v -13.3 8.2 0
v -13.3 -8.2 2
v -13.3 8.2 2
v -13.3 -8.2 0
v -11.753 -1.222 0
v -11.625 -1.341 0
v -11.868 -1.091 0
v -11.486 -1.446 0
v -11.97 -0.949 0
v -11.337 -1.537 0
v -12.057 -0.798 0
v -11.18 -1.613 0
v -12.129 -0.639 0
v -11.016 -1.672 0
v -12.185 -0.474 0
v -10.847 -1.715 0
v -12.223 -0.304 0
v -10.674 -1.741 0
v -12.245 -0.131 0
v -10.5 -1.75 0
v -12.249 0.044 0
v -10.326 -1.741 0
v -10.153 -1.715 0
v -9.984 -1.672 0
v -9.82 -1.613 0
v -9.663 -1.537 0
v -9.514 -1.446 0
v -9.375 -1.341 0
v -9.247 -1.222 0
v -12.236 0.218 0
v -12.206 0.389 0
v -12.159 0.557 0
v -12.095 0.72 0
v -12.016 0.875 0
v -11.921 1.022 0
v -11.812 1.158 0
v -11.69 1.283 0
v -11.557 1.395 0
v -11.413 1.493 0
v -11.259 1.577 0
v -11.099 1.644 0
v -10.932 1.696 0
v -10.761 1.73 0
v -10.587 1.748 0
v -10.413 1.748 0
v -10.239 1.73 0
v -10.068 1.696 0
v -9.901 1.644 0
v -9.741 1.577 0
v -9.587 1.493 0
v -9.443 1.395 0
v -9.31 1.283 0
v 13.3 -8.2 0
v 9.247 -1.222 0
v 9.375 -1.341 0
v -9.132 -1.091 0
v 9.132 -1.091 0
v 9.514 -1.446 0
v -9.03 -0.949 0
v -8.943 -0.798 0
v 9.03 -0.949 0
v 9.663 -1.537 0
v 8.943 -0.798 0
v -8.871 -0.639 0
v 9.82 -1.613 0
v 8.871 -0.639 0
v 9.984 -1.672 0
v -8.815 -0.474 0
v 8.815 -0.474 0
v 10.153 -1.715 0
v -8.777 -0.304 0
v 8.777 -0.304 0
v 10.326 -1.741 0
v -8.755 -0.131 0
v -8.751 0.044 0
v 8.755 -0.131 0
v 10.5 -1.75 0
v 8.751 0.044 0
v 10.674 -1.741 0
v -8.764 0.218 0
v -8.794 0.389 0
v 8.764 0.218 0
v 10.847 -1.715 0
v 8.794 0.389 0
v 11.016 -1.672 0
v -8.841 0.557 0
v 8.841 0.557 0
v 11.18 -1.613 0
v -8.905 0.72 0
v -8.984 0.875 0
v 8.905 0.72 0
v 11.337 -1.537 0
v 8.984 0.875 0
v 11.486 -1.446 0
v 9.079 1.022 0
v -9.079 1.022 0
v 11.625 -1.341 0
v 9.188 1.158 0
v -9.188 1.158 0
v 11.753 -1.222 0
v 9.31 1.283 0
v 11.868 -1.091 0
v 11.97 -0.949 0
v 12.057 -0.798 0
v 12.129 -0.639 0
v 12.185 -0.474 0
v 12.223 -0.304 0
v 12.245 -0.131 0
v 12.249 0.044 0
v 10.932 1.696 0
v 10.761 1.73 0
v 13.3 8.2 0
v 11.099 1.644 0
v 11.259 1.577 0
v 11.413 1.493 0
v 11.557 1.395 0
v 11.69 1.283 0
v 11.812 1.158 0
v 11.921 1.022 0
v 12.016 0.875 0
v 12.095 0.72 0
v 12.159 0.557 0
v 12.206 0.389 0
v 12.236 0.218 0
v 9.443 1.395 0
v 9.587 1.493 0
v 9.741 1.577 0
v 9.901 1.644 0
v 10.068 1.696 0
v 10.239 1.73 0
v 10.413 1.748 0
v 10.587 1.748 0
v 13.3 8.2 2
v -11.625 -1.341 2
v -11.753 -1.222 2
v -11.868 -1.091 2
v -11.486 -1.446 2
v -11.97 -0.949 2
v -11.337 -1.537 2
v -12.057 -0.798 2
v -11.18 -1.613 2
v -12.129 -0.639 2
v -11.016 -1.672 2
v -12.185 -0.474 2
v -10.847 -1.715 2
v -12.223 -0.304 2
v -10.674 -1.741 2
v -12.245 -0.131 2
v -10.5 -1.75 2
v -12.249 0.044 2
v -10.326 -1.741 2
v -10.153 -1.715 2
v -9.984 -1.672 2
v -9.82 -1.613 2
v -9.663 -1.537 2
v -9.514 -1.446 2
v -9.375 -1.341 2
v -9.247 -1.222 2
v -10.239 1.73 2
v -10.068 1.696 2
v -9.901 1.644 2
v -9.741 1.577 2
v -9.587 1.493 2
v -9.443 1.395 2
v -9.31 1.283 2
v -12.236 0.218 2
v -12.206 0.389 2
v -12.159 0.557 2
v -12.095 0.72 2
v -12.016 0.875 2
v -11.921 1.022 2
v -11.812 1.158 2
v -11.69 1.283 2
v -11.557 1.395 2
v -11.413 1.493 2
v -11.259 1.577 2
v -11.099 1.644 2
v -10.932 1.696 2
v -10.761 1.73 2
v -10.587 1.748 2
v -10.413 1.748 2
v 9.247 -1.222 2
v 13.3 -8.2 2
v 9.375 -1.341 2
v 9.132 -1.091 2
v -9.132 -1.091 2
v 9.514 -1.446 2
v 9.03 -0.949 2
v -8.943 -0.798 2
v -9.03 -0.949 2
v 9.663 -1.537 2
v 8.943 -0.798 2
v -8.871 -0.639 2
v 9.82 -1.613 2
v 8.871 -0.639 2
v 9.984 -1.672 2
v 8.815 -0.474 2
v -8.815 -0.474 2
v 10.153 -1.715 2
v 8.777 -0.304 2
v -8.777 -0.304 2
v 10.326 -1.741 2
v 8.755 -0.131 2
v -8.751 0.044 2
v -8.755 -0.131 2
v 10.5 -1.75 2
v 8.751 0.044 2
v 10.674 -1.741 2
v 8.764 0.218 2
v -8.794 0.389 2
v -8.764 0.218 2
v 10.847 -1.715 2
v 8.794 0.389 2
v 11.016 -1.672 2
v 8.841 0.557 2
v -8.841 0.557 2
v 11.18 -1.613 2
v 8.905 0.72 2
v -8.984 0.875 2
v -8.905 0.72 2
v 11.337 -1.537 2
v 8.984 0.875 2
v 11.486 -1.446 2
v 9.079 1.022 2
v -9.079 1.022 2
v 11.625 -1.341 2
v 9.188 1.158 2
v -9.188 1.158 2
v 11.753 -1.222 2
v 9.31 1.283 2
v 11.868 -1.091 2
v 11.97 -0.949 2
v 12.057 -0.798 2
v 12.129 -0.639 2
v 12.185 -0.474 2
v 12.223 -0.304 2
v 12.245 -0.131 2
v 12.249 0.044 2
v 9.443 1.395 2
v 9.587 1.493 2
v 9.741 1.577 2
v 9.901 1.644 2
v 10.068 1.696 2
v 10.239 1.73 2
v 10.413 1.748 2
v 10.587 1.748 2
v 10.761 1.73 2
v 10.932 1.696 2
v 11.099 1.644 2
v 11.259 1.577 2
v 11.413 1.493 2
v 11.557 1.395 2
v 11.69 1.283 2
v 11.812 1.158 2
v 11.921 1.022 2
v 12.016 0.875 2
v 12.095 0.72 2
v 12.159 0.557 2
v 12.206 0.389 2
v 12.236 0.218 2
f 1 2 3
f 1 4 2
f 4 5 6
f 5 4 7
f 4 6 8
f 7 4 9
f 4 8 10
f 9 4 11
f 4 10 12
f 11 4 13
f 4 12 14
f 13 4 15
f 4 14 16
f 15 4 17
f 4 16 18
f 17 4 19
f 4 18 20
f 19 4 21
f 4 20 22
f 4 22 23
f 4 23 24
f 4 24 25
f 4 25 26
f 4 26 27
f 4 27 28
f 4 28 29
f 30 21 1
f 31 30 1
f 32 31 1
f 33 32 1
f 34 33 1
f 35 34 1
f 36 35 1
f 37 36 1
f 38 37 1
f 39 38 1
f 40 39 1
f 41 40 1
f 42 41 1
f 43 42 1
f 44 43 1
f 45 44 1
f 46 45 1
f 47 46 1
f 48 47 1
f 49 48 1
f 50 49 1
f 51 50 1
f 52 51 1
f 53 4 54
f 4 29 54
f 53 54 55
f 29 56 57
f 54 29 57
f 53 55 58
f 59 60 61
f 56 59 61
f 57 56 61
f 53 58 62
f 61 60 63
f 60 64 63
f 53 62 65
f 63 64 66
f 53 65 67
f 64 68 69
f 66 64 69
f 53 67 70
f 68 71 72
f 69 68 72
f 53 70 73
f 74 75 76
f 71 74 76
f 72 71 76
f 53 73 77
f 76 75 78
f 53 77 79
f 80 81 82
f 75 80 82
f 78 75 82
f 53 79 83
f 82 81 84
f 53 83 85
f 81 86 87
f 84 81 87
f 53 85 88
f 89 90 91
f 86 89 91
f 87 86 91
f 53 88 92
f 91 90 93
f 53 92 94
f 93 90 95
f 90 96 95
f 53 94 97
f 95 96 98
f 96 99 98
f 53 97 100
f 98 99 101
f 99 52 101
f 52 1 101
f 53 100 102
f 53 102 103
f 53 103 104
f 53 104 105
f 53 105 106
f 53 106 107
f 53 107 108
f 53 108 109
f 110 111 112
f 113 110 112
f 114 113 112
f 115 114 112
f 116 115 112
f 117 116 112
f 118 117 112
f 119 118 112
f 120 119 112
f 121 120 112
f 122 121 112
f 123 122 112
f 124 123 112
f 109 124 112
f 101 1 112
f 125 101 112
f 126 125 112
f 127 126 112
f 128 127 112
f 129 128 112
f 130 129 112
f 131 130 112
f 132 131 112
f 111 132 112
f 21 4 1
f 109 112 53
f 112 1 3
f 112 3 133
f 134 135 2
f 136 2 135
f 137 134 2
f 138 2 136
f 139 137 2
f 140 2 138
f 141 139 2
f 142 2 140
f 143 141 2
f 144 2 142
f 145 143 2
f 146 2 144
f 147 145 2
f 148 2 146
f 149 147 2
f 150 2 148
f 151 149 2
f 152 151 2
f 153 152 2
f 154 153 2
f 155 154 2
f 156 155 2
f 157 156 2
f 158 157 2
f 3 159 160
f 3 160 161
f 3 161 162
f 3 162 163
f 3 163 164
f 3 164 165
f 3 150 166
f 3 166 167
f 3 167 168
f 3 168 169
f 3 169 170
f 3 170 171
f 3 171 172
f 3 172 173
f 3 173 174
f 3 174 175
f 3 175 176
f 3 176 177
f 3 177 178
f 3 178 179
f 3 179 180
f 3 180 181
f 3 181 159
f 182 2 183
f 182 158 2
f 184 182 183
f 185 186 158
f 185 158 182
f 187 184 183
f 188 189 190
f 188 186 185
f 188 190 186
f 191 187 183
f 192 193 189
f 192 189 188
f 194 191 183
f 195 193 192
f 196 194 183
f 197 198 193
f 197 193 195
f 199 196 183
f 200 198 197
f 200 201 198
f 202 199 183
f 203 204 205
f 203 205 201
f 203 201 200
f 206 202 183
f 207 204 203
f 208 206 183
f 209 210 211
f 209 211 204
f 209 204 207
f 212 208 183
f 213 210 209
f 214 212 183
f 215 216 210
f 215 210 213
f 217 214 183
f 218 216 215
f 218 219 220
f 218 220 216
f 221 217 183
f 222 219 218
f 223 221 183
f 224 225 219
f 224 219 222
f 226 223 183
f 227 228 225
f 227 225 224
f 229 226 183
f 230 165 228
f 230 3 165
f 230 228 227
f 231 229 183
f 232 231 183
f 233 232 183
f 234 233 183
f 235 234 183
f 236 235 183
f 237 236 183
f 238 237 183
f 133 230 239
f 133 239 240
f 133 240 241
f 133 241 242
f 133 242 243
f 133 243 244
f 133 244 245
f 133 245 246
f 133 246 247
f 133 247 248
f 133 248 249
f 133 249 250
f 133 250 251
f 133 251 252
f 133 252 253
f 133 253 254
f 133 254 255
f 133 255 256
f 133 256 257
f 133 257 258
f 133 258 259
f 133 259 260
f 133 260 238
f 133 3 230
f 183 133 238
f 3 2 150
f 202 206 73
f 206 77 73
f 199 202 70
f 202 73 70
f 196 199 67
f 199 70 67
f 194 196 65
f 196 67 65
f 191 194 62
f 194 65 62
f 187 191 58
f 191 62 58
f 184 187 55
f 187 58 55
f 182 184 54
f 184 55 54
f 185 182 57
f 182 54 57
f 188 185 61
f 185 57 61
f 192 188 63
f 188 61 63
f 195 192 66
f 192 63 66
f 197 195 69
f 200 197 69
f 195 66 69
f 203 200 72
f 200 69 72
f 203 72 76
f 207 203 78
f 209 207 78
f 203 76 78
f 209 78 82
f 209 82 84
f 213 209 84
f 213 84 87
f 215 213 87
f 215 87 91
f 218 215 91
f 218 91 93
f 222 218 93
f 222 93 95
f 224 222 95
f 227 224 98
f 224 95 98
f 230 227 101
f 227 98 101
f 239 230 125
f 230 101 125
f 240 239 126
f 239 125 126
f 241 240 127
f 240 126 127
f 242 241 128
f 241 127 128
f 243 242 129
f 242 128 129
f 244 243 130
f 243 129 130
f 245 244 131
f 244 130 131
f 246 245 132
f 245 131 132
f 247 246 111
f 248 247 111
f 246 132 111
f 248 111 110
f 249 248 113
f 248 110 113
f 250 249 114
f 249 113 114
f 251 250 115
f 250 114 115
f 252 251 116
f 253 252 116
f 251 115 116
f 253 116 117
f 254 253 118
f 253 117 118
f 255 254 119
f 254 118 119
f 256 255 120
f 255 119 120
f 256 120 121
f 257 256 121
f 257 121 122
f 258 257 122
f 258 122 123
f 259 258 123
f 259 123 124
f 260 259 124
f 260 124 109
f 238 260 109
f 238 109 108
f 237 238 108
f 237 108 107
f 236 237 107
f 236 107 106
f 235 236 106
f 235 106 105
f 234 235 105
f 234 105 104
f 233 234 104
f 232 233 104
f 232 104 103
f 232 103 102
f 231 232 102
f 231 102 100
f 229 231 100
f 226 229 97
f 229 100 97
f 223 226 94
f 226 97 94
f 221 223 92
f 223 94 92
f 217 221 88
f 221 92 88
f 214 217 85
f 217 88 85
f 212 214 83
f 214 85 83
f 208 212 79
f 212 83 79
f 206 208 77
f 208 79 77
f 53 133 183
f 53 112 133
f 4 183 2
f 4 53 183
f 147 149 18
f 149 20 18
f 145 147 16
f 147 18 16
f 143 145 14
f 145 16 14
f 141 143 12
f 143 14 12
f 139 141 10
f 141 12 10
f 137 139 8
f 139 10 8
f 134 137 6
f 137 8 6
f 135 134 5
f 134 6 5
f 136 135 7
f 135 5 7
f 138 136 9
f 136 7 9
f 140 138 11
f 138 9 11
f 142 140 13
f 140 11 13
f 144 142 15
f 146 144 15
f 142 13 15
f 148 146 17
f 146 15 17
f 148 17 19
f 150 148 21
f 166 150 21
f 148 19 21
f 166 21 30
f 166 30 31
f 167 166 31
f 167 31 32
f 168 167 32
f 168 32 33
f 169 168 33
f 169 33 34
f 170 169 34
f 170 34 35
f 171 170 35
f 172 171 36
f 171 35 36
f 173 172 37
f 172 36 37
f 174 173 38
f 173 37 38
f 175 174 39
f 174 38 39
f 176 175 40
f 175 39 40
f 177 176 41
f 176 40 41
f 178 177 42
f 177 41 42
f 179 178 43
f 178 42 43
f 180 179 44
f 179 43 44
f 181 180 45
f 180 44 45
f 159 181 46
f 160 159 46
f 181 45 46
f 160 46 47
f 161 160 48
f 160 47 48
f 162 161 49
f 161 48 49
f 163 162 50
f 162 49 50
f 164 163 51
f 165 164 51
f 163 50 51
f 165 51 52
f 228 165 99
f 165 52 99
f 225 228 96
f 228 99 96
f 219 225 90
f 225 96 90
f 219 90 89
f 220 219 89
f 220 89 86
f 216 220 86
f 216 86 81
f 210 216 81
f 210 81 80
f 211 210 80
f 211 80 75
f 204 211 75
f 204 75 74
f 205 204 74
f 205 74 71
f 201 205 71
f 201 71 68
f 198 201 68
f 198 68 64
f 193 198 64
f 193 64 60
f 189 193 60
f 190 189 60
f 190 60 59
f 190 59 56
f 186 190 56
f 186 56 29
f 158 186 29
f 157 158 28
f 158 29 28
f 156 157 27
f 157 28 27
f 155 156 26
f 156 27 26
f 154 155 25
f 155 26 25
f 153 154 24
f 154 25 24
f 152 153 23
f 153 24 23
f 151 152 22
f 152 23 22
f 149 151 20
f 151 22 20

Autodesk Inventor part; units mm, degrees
ref_plane "YZ Plane" through (0, 0, 0) normal (1, 0, 0) x (0, 1, 0)
ref_plane "XZ Plane" through (0, 0, 0) normal (0, 1, 0) x (-1, 0, 0)
ref_plane "XY Plane" through (0, 0, 0) normal (0, 0, 1) x (1, 0, 0)
sketch "Sketch1" plane through (0, 0, 0) normal (0, 0, 1) x (1, 0, 0)
  line L0 (-13.3, 8.2) -> (13.3, 8.2)
  line L1 (13.3, 8.2) -> (13.3, -8.2)
  line L2 (13.3, -8.2) -> (-13.3, -8.2)
  line L3 (-13.3, -8.2) -> (-13.3, 8.2)
  point P0 (0, 0)
  point P1 (-13.3, 0)
  point P2 (0, 8.2)
  dimension "d0" = 26.6
  dimension "d1" = 16.4
extrude "Extrusion1" add sketch "Sketch1" along normal blind 2
sketch "Sketch2" plane through (0, 0, 2) normal (0, 0, 1) x (1, 0, 0)
  circle A0 centre (-10.5, 0) radius 1.5
  circle A1 centre (10.5, 0) radius 1.5
  point P0 (0, 0)
  dimension "d4" = 3
  dimension "d5" = 21
  dimension "d6" = 10.5
hole "Hole1" at (10.5, 0, 2) direction (0, 0, -1) diameter 3.5 end through all
pattern_linear "Rectangular Pattern1" count 2 spacing 21 along (-1, 0, 0) of "Hole1"
equation "\"d6\" = 0.5 * d5"
equation "\"d16\" = d5"
properties part number "LogicLevelConverter" material "PET Plastic"
